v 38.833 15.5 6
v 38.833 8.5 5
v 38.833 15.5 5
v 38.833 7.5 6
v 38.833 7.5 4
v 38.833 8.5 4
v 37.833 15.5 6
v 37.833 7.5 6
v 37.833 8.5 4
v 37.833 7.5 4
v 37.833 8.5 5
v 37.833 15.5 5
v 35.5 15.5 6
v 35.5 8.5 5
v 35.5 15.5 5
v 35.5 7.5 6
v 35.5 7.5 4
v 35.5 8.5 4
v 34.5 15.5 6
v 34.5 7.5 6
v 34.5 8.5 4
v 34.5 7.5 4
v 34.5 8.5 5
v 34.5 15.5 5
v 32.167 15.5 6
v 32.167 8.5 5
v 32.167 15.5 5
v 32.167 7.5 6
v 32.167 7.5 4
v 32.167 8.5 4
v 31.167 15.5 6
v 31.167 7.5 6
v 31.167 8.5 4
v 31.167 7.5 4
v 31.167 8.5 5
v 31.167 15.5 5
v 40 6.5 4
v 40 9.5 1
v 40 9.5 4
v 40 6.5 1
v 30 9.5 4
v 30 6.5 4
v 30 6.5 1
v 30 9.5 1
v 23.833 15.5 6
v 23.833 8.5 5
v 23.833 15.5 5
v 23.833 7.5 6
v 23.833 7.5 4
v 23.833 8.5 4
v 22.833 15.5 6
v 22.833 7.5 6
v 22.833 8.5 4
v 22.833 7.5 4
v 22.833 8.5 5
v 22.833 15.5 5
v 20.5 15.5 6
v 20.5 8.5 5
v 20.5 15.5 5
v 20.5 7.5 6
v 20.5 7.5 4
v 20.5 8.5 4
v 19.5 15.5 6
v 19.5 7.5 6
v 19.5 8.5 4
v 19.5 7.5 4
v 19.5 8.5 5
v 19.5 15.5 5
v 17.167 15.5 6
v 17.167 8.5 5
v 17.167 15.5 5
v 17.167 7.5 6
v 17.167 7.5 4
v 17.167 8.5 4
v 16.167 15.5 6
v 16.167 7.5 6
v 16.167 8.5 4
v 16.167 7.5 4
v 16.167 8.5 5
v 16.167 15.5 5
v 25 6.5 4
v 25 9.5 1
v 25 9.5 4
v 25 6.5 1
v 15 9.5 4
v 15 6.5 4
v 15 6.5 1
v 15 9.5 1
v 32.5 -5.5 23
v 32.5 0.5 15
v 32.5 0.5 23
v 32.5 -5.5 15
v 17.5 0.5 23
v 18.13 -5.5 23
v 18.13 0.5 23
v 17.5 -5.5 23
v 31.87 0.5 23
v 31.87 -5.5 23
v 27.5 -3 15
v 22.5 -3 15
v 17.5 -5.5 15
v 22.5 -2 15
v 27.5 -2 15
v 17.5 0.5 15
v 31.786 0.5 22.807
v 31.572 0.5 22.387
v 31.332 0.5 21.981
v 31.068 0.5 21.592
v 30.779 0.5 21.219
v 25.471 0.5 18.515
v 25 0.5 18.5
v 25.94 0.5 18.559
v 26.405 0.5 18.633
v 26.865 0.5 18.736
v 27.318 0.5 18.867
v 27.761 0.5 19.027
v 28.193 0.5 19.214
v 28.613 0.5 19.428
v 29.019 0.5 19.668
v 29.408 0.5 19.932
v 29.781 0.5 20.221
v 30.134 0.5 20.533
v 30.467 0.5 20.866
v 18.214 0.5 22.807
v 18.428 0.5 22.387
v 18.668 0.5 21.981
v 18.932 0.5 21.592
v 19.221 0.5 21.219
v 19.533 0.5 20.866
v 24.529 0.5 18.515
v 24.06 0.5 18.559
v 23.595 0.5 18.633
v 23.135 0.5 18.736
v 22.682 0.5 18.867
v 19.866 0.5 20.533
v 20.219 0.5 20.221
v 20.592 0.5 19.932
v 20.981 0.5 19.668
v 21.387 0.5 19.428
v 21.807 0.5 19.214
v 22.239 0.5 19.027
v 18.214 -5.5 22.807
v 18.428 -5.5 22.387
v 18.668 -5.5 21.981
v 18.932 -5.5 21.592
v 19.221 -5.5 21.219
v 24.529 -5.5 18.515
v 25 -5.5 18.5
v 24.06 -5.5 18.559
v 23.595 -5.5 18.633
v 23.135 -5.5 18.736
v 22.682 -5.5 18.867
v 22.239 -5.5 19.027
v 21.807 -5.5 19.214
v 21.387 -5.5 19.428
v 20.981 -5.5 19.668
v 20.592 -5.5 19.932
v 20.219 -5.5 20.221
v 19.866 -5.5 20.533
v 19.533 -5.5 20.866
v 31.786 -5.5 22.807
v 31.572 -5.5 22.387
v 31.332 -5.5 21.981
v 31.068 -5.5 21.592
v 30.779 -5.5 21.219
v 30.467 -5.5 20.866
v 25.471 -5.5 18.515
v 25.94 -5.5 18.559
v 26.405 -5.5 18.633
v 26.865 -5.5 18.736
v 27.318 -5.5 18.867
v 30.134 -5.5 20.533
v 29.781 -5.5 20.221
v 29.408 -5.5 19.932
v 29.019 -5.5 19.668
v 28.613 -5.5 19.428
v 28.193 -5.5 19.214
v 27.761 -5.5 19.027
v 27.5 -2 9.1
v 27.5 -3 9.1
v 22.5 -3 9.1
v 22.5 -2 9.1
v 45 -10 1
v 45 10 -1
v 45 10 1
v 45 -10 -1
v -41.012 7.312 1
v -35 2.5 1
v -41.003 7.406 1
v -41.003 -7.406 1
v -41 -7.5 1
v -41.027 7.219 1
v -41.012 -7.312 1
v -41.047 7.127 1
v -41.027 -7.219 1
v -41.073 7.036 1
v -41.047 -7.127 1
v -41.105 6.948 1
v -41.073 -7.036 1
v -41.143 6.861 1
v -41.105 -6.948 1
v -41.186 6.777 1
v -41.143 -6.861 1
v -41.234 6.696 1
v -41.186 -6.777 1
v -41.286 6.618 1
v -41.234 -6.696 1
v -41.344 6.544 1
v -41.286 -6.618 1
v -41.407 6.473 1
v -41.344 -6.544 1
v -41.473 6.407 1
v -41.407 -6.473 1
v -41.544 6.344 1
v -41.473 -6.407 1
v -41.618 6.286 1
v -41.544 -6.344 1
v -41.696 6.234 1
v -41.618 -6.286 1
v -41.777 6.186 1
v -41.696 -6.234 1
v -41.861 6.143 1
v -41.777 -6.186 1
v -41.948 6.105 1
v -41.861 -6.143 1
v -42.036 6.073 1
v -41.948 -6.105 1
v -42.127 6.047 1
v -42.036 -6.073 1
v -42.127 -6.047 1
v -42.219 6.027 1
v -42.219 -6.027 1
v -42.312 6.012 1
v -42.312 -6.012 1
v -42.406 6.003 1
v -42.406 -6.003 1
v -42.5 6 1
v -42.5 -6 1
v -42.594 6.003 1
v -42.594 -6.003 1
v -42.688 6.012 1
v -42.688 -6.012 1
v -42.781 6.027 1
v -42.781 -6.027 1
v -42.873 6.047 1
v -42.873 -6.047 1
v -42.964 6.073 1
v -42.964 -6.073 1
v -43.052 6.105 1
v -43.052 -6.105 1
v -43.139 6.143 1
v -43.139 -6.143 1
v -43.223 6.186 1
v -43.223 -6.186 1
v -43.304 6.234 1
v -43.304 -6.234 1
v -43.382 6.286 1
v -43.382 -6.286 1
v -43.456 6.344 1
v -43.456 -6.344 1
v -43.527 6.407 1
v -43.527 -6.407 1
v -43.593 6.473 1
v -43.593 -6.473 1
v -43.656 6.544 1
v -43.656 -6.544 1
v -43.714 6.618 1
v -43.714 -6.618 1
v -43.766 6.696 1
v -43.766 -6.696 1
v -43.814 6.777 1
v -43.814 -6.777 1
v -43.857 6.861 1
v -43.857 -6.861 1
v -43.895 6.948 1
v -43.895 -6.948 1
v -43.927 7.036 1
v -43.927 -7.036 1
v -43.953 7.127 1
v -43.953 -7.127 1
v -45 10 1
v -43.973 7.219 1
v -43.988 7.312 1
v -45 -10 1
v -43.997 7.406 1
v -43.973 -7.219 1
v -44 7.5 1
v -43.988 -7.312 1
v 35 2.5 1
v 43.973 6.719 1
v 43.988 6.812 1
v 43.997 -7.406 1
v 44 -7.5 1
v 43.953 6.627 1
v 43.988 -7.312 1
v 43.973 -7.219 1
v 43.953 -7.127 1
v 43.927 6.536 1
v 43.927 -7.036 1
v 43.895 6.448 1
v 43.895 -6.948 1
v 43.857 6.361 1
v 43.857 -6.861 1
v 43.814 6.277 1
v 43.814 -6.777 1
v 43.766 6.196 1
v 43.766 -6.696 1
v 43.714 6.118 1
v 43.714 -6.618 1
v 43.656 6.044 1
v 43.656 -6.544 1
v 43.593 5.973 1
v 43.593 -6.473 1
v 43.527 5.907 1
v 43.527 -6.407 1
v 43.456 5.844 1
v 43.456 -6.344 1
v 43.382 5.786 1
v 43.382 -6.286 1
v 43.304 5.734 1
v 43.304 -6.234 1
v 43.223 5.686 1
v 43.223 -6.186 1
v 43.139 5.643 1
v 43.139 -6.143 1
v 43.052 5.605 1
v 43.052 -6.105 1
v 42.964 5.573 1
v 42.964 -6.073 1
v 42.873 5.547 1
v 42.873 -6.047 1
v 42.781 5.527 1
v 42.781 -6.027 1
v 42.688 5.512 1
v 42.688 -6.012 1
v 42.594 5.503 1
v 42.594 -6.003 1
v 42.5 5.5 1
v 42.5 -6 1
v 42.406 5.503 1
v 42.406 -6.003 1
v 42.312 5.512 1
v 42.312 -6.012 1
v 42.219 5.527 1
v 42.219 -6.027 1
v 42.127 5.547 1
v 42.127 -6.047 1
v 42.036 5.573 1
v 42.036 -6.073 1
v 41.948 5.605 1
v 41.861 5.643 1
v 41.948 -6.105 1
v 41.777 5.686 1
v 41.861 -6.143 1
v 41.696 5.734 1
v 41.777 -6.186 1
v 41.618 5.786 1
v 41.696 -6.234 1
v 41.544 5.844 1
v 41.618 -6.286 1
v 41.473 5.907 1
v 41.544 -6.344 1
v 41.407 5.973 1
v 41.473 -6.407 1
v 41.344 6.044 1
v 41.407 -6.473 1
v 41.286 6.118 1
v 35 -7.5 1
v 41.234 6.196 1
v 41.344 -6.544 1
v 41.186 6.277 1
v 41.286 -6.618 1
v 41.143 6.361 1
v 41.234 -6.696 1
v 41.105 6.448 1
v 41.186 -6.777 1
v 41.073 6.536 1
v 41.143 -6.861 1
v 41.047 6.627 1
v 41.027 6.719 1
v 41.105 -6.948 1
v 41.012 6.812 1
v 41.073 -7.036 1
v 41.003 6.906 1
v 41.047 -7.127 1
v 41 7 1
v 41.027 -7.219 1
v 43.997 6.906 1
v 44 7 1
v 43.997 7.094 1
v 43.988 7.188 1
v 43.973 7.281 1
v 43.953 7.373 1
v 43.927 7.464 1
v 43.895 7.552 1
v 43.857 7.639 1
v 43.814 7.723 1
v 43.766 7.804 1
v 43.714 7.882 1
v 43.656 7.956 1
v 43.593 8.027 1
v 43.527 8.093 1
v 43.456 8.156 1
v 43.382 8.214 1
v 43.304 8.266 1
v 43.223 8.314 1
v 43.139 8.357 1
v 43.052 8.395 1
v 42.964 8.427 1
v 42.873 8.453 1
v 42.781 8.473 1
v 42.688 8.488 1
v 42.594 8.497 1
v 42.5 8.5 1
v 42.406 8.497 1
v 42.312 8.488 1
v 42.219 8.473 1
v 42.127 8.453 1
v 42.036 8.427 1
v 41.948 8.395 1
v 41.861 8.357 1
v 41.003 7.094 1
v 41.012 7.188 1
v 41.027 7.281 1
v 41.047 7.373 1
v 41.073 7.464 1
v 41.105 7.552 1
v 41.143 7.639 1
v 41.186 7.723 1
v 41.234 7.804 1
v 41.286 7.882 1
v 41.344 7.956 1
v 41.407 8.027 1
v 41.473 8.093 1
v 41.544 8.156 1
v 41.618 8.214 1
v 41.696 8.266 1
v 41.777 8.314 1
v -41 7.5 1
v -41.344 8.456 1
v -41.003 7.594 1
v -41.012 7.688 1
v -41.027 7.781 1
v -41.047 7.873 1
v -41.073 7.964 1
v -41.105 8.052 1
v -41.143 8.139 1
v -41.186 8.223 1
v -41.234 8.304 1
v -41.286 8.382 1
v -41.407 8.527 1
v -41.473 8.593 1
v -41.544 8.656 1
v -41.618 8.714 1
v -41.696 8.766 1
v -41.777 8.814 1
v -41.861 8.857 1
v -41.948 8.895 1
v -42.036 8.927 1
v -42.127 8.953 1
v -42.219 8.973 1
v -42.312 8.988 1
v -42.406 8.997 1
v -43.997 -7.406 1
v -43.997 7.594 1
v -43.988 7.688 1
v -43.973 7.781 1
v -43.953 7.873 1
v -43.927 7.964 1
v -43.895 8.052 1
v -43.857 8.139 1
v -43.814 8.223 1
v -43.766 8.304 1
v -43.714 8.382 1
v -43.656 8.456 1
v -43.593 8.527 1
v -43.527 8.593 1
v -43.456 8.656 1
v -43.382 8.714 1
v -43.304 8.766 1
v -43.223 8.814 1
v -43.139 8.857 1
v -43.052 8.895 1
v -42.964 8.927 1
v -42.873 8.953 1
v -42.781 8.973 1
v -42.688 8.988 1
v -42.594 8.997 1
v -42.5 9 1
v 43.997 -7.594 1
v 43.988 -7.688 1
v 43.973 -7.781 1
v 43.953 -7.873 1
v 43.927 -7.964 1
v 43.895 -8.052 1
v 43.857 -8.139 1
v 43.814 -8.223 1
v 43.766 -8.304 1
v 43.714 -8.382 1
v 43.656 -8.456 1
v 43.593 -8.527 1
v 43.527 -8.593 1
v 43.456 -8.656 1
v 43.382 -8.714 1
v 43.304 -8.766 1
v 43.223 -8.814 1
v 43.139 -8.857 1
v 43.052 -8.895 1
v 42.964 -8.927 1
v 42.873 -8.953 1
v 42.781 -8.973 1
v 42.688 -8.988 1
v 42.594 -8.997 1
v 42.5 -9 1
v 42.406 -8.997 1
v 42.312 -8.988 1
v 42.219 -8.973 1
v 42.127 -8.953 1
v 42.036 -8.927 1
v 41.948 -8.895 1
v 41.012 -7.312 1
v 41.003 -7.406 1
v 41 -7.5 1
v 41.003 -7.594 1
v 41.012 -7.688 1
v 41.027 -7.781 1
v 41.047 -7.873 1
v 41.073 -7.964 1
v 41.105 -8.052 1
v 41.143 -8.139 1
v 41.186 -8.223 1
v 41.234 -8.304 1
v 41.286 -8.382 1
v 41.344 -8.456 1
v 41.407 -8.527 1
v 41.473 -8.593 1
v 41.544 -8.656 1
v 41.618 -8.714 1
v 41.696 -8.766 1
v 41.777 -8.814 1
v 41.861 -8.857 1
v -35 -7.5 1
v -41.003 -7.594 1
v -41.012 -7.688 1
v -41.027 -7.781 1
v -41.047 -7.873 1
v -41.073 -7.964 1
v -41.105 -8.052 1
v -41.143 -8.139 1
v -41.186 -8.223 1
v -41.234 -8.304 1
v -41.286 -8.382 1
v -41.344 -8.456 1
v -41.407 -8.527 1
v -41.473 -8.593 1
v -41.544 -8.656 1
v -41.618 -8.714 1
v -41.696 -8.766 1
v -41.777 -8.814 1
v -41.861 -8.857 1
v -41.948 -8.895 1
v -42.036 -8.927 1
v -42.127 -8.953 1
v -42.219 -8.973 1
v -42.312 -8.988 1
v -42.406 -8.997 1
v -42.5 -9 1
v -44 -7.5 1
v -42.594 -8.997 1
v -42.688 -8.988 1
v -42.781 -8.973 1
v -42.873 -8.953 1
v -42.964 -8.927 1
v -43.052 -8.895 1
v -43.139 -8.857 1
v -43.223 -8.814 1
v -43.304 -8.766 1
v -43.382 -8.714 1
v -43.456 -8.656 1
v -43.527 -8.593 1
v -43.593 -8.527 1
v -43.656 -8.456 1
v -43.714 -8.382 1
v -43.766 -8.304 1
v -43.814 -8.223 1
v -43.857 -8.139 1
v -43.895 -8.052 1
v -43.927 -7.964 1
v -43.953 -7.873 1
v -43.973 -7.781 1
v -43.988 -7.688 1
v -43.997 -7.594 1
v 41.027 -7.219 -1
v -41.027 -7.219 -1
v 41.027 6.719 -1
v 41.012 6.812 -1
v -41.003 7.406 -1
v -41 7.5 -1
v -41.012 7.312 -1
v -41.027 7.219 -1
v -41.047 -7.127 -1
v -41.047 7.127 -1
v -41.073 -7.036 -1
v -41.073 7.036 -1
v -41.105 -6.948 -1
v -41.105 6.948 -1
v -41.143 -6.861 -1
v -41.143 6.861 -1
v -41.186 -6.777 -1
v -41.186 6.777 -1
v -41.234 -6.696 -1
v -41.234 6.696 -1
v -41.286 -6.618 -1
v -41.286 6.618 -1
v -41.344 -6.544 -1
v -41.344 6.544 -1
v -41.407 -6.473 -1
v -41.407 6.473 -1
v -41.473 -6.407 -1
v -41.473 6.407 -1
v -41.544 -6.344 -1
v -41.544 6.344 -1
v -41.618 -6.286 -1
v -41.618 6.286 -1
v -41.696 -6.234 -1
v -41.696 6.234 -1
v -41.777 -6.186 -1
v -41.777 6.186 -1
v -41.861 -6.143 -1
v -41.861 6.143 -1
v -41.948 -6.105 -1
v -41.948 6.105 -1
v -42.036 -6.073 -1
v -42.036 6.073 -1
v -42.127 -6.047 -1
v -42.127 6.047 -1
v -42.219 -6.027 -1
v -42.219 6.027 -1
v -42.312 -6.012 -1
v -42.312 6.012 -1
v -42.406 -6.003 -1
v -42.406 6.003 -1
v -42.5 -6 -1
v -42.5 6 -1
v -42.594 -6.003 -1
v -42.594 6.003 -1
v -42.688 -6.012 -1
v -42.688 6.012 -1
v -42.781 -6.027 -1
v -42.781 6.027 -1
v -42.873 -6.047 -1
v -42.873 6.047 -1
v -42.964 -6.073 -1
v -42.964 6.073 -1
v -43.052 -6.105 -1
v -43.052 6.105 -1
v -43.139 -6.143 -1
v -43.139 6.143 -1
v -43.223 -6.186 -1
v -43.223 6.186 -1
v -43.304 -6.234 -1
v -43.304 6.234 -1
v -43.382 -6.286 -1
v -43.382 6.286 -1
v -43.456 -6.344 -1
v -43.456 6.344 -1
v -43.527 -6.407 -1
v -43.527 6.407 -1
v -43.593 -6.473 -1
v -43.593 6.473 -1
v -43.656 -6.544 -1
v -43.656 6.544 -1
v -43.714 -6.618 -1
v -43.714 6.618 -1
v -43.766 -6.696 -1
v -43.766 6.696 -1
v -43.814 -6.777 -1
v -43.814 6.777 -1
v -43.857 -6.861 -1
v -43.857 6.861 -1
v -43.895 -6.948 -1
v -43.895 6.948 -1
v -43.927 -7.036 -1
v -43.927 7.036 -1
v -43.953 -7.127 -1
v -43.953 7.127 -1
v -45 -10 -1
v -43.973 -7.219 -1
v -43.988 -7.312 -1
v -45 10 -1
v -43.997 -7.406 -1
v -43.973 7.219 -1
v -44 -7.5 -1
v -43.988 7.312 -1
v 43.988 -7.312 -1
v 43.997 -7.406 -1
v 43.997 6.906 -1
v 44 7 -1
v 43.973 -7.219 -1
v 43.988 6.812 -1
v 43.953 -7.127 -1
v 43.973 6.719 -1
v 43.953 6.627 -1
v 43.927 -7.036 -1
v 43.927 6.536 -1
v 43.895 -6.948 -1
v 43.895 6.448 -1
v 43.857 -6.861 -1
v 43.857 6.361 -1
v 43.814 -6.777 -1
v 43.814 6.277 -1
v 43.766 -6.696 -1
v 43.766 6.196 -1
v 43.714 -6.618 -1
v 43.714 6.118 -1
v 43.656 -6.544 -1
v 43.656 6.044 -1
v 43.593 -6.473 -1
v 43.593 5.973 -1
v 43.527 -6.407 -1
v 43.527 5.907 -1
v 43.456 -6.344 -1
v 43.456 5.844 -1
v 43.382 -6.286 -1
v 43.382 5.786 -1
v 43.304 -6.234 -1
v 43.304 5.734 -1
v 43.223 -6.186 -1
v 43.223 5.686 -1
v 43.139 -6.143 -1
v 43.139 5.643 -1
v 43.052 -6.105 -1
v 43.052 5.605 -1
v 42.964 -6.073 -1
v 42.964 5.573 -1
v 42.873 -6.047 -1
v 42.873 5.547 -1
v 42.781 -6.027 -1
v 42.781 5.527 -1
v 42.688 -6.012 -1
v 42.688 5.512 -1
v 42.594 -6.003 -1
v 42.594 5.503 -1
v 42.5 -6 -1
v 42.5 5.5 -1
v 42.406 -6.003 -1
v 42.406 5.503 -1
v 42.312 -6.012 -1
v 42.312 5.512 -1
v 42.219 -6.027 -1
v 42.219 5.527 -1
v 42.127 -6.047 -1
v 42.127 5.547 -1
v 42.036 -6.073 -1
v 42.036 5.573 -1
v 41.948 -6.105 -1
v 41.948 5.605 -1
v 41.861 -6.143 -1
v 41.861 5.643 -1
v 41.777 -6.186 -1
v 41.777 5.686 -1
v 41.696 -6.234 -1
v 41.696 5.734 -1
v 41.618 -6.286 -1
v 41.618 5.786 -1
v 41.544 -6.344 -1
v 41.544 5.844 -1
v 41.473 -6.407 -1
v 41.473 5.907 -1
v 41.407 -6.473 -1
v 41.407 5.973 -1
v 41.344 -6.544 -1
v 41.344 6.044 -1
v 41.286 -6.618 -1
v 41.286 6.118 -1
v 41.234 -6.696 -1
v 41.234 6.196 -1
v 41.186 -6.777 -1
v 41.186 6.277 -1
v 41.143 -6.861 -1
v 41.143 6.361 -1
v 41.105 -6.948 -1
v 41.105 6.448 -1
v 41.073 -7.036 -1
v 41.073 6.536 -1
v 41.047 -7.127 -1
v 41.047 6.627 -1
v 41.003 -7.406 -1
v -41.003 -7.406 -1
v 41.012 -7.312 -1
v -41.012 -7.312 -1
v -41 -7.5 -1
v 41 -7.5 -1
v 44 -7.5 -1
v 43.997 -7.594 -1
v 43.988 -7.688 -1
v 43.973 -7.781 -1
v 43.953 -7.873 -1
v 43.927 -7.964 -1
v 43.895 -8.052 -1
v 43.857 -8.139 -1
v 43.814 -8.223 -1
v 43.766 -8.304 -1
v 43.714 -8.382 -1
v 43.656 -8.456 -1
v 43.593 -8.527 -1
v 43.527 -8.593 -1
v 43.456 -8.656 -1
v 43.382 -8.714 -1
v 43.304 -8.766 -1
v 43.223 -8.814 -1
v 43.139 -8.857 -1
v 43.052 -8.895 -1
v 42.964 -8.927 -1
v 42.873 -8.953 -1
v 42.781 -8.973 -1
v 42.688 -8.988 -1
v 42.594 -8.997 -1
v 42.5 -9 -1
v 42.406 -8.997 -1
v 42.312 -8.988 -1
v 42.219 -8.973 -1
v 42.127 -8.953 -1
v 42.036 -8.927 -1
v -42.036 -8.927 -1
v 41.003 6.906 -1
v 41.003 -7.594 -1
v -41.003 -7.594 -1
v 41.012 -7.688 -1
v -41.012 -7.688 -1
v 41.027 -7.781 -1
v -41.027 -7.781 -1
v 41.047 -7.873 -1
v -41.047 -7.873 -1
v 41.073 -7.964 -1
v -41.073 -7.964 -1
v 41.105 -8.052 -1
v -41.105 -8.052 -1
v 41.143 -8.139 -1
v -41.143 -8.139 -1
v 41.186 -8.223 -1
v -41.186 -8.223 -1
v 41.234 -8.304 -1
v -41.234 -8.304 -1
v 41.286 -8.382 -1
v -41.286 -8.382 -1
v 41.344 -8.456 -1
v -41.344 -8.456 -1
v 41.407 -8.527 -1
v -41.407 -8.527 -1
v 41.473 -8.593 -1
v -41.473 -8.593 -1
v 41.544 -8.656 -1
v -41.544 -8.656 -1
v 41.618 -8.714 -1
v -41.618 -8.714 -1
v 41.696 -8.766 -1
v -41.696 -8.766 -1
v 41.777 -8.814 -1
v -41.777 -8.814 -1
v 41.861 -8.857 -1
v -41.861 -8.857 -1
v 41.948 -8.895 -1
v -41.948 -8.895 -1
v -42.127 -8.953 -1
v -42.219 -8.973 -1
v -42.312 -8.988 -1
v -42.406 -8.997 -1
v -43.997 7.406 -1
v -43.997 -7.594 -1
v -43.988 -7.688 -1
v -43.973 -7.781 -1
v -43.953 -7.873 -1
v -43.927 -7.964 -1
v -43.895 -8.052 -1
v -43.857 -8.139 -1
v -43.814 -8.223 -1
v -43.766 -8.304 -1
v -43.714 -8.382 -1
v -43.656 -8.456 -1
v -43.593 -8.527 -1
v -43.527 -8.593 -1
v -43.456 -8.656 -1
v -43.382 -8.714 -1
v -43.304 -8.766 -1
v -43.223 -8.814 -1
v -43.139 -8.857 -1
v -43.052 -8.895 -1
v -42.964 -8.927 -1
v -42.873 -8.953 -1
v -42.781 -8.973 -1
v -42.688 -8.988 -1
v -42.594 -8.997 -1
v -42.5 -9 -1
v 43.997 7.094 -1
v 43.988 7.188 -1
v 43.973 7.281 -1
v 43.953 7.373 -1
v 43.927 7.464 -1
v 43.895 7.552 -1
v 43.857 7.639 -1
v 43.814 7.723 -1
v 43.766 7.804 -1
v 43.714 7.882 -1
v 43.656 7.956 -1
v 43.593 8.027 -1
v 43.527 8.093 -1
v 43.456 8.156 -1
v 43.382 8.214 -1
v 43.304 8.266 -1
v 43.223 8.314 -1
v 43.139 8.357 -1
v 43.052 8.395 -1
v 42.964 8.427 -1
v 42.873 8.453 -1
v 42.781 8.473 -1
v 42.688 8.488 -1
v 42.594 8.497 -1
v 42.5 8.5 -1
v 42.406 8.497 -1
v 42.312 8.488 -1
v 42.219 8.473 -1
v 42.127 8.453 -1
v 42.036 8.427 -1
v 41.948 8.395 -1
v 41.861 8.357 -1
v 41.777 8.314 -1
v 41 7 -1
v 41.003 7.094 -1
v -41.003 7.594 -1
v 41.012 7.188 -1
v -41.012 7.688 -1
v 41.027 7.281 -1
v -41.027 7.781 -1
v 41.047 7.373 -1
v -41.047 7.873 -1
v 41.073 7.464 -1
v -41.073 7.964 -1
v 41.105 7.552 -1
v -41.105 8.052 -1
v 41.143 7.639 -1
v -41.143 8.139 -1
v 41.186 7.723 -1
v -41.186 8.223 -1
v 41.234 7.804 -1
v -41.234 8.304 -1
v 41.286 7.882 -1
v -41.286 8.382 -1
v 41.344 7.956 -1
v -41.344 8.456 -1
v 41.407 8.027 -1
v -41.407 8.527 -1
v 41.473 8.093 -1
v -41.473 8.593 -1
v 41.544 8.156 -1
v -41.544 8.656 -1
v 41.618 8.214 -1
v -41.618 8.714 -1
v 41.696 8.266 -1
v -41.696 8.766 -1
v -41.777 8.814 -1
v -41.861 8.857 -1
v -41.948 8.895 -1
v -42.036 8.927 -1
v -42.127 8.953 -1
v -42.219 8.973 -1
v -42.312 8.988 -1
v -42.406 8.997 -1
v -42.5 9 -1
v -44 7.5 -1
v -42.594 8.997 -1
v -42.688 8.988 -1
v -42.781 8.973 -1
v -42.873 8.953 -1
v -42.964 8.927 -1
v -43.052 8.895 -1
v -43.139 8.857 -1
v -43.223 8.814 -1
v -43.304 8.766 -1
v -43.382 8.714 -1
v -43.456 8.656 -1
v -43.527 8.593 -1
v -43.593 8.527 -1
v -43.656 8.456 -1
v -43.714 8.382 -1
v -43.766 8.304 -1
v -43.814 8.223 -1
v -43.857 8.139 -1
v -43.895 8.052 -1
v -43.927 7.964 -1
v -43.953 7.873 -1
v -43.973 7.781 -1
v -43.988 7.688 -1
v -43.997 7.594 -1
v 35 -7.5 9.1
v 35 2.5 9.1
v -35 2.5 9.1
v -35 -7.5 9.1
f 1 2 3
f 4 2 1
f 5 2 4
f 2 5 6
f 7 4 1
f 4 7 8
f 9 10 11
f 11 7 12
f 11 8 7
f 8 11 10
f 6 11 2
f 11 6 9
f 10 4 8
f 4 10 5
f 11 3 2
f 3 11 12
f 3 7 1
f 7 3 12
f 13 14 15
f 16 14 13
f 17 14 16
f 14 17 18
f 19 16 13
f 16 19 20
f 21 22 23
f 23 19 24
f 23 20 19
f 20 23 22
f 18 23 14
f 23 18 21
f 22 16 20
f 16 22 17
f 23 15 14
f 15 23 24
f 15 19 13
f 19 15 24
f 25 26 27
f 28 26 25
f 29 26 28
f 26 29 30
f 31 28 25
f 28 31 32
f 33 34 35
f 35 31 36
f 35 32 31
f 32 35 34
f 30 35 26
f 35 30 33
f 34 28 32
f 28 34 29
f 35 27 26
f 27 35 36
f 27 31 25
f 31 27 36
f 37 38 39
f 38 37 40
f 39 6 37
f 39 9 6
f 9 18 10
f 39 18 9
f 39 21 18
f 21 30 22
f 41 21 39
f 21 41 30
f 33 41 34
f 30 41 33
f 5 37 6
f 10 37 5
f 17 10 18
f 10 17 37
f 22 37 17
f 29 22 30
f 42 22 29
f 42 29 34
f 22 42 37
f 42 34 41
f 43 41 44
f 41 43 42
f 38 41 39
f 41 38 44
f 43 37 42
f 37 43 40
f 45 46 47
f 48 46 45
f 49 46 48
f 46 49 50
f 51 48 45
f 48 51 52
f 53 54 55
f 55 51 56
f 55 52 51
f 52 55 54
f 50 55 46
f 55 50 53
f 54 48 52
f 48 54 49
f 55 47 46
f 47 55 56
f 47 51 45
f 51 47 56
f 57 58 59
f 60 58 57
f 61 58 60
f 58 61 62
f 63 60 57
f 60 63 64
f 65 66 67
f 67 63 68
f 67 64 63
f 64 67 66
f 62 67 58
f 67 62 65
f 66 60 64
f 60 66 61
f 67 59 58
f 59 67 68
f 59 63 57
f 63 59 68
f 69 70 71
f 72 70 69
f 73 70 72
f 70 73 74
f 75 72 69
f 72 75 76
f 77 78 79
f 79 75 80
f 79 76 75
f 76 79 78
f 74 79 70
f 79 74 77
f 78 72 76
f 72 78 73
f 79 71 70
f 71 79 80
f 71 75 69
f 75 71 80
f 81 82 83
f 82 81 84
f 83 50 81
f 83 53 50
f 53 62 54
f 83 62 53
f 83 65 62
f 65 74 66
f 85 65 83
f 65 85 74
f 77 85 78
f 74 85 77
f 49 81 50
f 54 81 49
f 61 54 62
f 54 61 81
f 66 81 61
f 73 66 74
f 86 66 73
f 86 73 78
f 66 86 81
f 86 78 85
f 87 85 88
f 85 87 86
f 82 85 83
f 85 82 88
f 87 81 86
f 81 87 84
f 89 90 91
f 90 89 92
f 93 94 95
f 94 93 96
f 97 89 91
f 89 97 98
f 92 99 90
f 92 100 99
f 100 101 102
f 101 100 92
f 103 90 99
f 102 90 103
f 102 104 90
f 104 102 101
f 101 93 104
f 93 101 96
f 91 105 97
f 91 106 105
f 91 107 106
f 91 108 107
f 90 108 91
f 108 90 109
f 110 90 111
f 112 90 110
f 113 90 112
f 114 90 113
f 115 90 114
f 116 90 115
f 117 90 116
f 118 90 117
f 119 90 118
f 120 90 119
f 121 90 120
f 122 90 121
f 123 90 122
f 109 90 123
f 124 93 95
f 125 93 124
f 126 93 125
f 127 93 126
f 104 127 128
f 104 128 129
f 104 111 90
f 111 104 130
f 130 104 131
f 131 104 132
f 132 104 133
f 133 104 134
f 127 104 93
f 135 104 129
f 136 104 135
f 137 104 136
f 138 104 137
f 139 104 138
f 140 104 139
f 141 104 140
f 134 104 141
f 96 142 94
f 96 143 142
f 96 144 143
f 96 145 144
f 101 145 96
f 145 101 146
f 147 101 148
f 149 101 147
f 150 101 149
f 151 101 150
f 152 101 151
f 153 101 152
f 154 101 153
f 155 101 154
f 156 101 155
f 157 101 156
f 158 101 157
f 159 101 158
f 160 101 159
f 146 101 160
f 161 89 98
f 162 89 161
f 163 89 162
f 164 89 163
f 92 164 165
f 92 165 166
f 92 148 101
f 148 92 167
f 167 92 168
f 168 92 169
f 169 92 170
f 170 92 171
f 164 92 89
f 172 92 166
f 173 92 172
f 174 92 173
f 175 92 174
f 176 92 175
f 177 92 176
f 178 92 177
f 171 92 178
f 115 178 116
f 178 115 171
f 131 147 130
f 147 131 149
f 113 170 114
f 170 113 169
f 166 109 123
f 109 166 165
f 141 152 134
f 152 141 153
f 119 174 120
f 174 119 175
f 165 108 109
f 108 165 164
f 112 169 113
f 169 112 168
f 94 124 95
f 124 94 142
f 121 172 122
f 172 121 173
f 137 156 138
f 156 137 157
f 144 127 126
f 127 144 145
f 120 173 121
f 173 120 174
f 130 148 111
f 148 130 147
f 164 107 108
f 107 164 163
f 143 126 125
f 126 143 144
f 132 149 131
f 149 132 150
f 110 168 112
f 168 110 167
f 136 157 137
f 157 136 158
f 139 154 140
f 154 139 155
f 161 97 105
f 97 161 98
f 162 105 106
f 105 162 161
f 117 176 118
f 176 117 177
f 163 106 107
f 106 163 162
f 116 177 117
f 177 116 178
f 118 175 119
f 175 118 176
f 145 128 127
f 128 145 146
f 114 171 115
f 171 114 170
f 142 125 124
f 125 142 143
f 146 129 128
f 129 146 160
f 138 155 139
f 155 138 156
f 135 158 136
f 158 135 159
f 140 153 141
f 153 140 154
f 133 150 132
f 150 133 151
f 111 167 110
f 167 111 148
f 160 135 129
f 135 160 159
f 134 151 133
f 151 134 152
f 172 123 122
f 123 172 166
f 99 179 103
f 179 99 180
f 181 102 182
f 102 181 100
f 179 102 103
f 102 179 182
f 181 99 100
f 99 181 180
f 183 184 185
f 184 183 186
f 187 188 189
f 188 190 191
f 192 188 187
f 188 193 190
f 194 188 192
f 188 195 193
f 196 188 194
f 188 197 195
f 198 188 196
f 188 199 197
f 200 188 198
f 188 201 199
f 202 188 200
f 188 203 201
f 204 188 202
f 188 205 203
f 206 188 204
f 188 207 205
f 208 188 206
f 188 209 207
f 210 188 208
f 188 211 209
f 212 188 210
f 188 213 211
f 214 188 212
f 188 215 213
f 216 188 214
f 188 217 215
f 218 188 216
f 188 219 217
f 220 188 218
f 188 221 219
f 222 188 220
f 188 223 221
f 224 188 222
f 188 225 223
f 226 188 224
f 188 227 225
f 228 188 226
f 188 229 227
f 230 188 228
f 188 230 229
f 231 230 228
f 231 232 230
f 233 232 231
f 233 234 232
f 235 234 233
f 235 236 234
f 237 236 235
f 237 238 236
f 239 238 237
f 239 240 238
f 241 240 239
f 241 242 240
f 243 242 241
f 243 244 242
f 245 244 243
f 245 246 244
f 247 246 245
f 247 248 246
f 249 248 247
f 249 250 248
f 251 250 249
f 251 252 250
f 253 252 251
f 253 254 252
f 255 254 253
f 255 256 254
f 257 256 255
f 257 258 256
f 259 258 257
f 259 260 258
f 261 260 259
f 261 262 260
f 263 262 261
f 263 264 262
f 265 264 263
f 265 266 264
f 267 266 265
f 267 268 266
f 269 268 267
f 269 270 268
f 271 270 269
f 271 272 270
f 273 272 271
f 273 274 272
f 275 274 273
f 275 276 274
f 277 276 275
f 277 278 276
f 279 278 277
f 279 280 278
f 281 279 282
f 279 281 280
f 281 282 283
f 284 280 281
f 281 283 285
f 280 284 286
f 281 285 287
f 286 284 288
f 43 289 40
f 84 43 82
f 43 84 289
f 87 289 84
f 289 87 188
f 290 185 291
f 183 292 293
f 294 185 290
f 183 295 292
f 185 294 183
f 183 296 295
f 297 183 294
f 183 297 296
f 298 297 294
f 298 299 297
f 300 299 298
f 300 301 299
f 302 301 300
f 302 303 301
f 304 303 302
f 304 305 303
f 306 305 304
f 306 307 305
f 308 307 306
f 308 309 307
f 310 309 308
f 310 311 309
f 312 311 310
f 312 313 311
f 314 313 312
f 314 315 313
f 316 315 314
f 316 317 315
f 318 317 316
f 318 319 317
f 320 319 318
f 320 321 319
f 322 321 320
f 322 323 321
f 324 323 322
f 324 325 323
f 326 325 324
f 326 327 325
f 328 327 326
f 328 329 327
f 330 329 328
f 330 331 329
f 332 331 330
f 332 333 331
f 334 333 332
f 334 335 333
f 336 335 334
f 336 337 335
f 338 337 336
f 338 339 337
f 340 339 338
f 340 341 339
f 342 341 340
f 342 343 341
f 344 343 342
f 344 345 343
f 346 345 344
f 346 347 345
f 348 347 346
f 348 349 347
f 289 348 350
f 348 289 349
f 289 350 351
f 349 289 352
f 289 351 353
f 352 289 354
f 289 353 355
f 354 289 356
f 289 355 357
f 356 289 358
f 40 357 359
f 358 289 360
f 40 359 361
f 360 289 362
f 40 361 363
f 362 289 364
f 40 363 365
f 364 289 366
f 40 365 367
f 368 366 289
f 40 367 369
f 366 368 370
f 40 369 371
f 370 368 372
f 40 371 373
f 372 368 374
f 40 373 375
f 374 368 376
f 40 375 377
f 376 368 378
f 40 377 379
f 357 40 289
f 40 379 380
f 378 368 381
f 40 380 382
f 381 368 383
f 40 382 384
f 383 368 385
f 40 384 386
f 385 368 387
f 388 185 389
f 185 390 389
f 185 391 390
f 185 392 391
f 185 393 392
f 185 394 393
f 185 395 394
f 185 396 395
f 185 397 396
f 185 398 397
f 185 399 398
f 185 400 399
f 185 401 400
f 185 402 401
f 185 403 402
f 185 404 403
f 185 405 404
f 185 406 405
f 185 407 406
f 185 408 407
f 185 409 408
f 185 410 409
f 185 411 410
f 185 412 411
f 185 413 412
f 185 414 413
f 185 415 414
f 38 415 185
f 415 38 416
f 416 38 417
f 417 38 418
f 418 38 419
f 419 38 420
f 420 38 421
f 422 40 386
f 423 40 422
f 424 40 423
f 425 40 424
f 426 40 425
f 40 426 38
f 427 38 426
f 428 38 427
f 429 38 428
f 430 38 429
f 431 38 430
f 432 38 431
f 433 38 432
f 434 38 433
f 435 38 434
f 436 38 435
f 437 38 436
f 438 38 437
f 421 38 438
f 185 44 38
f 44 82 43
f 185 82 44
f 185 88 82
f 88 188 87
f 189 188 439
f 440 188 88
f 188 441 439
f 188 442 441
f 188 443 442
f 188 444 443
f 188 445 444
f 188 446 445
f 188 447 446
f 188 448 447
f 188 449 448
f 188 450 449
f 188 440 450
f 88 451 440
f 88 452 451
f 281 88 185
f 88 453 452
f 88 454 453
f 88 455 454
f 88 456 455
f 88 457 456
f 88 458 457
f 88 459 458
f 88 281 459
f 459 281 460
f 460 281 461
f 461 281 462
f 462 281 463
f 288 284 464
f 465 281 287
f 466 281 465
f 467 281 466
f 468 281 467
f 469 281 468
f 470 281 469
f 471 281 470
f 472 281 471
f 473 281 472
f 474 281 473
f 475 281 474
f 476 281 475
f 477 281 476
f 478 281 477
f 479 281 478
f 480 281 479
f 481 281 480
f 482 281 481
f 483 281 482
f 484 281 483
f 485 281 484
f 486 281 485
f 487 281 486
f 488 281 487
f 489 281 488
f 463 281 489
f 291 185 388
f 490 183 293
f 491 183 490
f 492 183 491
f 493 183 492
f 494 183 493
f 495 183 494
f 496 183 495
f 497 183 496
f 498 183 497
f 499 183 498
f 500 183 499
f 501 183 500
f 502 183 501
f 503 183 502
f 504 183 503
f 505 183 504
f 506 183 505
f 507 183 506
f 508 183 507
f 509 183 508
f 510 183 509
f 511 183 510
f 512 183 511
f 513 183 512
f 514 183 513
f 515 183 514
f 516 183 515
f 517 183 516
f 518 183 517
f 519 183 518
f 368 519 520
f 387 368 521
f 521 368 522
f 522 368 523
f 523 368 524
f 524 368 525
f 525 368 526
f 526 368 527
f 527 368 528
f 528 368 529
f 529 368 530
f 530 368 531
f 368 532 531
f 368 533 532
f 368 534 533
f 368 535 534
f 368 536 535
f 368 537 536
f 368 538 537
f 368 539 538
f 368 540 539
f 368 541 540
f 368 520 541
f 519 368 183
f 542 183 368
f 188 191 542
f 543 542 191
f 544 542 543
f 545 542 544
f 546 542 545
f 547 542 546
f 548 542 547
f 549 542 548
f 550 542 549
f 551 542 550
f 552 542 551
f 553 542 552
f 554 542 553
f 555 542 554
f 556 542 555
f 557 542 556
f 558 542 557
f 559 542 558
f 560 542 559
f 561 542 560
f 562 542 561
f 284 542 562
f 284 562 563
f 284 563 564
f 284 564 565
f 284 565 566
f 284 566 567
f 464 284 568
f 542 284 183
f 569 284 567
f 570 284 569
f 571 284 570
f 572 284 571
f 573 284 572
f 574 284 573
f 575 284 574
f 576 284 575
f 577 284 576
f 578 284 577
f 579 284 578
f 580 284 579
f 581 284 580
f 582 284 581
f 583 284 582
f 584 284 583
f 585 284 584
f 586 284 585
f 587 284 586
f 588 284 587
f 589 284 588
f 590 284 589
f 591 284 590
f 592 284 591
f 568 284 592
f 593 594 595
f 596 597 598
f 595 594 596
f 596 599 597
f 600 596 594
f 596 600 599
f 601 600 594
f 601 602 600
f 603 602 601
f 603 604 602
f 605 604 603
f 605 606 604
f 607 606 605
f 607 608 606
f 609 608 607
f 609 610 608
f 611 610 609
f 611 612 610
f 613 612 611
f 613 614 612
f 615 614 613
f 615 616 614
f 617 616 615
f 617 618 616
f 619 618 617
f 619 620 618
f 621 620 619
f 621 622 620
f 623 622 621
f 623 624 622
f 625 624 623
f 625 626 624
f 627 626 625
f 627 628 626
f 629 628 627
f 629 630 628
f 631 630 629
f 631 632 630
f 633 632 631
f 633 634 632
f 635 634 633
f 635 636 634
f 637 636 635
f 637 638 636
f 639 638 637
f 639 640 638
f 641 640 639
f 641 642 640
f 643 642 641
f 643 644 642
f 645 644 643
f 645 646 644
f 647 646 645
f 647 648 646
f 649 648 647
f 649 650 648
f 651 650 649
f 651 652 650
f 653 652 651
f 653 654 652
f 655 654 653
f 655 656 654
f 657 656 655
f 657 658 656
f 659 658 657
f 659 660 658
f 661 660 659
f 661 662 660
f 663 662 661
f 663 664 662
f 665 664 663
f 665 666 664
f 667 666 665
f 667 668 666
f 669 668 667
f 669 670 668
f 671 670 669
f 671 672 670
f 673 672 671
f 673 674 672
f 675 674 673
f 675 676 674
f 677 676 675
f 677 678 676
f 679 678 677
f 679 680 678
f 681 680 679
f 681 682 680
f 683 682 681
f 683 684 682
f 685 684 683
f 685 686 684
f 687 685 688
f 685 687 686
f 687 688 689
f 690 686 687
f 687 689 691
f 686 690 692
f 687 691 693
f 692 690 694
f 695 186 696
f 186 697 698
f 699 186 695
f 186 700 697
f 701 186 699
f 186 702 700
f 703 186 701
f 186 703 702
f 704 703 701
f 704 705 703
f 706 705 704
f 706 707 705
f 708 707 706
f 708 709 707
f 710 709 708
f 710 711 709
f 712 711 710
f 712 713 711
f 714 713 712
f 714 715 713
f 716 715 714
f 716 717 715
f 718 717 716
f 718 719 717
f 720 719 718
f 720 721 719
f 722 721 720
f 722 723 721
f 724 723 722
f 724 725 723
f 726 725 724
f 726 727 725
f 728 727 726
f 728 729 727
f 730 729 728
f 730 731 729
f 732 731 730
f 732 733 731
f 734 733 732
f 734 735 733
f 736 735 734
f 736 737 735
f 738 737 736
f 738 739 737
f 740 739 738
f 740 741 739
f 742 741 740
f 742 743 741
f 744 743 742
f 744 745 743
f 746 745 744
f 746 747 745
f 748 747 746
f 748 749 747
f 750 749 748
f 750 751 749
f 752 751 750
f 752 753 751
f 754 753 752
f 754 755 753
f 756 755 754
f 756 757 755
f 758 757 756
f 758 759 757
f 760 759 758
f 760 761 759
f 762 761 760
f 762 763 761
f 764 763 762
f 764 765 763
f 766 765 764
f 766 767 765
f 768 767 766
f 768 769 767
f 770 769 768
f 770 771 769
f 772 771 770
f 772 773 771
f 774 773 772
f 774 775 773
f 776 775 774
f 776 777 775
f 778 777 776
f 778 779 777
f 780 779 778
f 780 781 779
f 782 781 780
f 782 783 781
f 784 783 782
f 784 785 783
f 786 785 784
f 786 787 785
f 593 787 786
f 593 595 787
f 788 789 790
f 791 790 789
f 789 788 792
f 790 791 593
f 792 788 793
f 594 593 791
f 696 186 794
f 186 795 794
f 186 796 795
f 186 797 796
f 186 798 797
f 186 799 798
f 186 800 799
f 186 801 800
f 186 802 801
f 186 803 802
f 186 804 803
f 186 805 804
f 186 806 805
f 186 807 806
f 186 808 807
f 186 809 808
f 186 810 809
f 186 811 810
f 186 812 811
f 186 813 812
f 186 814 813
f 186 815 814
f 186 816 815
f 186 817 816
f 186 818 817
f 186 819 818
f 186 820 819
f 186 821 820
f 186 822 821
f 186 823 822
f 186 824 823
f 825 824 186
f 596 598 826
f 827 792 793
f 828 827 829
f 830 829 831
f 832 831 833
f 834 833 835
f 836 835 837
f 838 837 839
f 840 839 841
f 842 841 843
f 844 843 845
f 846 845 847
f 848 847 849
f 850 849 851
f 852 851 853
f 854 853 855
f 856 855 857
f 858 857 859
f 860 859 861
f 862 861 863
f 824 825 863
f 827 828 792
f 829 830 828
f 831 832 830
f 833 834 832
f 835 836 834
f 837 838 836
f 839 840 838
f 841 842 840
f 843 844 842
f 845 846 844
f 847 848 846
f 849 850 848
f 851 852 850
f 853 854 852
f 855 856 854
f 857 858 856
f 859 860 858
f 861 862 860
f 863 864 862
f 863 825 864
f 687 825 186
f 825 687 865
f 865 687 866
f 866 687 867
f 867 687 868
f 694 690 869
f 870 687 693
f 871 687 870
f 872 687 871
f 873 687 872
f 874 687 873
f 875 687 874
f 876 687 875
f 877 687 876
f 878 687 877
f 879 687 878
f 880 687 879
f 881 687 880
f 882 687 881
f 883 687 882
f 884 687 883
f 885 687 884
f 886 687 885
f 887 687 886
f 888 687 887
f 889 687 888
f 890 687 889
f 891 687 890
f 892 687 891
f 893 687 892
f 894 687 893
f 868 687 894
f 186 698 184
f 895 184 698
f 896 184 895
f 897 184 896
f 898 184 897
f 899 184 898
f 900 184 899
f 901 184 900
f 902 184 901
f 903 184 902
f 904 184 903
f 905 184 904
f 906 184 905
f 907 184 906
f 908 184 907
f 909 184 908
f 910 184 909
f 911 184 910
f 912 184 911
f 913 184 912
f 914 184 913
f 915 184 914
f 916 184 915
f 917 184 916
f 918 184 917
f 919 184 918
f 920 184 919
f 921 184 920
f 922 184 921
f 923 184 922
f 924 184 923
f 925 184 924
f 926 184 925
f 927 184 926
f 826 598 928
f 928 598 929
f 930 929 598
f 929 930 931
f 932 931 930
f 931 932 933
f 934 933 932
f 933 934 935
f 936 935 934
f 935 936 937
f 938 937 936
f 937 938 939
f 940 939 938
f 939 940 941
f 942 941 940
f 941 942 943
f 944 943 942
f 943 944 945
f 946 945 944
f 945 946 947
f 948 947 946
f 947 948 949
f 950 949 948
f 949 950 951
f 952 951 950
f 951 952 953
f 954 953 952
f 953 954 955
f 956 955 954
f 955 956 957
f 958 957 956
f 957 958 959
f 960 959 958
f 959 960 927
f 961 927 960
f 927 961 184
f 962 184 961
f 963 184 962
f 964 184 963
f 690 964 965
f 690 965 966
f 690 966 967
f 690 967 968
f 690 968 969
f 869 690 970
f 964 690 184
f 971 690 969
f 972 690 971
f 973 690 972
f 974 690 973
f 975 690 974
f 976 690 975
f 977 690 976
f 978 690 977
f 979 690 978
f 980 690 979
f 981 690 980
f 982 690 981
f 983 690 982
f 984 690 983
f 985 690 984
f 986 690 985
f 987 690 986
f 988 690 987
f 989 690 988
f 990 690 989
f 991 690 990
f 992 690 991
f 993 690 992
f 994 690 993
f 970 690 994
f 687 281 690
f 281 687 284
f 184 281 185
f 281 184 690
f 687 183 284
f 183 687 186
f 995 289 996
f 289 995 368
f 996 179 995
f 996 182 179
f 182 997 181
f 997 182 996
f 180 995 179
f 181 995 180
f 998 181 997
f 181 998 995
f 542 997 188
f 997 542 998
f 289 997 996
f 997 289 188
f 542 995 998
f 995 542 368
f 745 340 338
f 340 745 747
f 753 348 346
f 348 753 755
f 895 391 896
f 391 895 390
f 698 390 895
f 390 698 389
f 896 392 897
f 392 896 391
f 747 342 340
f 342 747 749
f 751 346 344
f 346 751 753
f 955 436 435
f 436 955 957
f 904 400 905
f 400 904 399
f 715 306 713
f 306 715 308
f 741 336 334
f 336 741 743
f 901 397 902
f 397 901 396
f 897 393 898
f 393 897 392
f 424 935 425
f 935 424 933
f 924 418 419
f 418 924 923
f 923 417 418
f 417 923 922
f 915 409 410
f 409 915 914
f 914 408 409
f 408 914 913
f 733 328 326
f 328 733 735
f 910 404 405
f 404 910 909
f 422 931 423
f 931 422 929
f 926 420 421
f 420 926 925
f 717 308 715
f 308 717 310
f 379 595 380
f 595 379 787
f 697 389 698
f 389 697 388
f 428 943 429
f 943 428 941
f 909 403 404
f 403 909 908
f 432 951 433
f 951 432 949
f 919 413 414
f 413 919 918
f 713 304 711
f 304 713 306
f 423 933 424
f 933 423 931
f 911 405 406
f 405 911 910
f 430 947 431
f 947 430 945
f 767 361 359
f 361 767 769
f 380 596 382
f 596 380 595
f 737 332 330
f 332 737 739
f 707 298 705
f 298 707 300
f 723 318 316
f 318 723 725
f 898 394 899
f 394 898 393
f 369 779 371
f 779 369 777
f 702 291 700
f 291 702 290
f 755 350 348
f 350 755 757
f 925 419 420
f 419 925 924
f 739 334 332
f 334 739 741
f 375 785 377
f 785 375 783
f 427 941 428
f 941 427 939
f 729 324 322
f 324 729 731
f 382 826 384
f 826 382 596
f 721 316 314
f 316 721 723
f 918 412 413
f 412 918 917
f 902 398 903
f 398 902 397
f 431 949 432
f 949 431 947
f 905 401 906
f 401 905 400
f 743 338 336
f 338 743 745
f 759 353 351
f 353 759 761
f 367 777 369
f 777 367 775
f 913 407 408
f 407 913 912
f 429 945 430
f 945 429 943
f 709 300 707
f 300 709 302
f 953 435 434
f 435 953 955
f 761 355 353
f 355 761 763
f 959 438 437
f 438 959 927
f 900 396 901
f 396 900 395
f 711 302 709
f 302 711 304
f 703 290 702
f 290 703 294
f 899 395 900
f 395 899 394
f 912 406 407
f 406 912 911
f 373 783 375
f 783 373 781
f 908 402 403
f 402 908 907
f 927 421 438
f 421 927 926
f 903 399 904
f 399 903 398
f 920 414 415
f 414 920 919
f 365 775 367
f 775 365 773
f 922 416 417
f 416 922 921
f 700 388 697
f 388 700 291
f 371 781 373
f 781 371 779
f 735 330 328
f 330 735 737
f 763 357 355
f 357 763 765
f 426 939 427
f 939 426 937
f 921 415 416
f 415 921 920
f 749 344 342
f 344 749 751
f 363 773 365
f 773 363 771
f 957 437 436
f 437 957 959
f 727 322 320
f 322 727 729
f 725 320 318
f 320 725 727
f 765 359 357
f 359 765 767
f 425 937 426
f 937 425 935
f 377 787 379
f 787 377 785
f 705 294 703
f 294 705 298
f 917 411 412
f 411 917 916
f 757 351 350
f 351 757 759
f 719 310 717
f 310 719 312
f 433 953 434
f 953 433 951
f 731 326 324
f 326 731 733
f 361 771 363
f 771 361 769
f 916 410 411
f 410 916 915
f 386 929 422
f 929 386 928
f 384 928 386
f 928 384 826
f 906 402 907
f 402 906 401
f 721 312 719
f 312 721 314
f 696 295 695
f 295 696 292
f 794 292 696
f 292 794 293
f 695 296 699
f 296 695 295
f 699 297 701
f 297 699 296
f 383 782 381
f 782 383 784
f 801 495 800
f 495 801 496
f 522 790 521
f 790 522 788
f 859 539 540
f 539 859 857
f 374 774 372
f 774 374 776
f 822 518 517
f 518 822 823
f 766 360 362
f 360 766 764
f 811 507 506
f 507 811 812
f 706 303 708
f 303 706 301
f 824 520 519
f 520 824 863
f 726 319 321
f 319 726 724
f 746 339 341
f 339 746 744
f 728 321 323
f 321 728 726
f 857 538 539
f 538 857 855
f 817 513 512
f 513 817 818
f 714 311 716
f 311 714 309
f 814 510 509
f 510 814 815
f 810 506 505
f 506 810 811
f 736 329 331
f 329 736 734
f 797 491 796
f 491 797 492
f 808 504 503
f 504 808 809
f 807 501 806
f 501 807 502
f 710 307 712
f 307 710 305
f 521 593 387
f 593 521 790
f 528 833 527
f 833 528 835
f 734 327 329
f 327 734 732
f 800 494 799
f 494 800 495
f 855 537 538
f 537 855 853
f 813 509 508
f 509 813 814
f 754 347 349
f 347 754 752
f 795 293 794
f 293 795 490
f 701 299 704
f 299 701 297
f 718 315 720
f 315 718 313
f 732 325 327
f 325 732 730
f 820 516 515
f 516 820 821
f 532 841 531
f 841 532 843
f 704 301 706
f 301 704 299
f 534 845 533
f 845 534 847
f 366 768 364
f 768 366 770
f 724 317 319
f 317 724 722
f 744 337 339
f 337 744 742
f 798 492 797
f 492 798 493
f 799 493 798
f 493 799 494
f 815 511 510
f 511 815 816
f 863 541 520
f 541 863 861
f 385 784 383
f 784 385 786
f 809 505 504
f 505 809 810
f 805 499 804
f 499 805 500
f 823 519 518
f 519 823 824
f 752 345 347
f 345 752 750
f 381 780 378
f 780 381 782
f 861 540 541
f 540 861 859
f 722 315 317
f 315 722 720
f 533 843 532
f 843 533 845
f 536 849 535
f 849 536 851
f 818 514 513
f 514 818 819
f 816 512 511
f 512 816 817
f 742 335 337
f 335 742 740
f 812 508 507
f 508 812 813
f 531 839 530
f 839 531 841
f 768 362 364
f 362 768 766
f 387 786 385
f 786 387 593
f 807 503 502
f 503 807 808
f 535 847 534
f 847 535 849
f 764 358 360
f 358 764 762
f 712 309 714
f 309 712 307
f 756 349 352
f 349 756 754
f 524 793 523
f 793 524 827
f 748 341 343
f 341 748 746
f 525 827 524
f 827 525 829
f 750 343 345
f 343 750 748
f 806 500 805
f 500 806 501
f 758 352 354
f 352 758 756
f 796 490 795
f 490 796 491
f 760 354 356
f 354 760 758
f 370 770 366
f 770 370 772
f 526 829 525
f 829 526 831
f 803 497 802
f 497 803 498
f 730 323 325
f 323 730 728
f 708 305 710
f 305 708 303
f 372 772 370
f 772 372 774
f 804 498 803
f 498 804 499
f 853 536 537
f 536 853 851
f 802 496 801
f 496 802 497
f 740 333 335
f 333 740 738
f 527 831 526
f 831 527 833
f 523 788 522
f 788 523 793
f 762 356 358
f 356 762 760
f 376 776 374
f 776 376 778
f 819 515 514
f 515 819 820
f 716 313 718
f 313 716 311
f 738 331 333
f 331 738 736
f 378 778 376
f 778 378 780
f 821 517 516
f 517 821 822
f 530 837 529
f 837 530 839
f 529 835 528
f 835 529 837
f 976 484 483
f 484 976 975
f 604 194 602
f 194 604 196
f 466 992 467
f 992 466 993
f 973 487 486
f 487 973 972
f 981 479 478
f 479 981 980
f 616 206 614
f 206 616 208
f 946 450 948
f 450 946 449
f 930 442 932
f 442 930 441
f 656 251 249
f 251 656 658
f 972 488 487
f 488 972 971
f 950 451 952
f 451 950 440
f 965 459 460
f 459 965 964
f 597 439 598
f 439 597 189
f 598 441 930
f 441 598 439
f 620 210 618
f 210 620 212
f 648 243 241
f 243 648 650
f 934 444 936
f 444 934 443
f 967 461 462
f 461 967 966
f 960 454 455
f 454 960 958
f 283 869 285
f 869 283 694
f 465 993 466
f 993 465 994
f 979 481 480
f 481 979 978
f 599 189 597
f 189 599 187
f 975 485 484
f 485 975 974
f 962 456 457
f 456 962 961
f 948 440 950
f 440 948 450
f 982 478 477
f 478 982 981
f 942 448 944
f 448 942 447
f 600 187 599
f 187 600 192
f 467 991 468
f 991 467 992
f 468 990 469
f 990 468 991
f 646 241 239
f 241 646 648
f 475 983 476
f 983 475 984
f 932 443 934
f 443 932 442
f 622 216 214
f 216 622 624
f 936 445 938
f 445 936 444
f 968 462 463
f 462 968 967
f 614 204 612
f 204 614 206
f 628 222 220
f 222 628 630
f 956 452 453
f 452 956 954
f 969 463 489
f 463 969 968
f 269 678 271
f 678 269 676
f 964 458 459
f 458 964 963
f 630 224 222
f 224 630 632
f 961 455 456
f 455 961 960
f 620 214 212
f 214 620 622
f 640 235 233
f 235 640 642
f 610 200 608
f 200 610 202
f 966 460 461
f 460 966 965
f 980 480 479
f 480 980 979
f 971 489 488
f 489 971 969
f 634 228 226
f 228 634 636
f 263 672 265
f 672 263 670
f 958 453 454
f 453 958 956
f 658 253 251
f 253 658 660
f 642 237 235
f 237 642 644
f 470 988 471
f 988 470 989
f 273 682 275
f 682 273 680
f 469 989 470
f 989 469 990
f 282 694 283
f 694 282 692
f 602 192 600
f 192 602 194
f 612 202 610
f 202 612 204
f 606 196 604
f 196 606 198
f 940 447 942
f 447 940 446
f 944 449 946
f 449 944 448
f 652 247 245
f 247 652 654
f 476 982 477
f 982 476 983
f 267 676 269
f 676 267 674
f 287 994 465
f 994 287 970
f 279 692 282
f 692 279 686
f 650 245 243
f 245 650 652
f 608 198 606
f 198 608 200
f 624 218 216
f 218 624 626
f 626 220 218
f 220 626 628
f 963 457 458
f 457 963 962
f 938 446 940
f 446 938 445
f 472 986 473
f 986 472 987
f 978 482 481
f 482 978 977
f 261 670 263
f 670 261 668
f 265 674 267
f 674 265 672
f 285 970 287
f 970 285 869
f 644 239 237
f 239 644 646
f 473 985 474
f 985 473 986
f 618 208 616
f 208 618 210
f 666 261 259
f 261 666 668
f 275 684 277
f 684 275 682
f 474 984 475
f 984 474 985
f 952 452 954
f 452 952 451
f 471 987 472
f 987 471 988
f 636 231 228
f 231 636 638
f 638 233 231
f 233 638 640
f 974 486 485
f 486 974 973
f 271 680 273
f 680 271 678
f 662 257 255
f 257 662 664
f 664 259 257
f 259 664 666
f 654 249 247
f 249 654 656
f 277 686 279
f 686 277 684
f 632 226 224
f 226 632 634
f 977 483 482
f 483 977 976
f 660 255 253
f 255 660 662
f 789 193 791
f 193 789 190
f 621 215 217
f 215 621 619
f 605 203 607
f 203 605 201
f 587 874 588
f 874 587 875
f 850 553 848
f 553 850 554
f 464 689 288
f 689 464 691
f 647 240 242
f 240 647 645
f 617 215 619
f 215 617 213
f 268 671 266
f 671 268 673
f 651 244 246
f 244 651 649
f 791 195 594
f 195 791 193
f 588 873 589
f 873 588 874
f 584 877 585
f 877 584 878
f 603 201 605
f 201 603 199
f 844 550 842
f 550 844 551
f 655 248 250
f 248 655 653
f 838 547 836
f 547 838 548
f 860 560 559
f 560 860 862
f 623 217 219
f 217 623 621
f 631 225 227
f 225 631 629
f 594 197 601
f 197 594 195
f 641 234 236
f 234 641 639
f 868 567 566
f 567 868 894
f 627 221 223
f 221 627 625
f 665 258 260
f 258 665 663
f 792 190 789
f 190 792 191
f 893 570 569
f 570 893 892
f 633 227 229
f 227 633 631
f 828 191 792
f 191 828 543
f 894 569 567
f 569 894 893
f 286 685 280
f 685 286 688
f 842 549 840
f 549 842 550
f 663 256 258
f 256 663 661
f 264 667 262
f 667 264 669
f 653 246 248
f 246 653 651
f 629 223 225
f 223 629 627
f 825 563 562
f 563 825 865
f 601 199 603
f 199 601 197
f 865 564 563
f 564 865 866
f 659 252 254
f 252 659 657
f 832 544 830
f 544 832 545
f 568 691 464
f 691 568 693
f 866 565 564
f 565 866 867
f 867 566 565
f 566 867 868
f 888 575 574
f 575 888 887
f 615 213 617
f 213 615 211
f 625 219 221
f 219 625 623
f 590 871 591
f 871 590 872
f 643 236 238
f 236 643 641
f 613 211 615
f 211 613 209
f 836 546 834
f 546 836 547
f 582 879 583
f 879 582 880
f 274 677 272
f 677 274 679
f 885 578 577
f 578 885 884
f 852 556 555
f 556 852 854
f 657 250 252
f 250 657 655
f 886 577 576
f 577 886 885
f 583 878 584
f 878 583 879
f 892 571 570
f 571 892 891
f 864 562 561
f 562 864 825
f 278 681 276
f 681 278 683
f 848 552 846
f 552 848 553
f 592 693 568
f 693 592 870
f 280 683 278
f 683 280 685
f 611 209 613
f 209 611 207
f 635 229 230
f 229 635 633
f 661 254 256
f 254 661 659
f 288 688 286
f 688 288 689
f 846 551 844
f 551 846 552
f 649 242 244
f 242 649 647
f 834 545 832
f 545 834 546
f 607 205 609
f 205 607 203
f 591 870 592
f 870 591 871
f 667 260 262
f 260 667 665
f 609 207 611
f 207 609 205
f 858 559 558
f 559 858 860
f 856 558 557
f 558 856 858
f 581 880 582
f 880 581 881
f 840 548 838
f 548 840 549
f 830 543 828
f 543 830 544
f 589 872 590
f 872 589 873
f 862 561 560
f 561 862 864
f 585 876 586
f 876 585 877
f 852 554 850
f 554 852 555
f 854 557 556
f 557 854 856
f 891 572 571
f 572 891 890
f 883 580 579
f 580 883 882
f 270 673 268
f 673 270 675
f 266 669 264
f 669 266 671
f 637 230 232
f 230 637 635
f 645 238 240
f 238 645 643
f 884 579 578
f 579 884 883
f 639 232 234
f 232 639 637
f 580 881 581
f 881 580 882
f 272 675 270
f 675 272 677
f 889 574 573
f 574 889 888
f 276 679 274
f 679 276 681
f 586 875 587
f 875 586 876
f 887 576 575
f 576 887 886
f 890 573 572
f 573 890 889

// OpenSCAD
spodok_dlzka = 90;
spodok_sirka = 20;
spodok_hrubka = 2;

piny_dlzka = 10;
piny_sirka = 3;
piny_hrubka = 4;

diera_d = 3 ; // d = diameter -> priemer

module diera()
{
    cylinder (h = 8, d = diera_d, center = true, $fn=100);
}
module spodok() 
{
    color( "red", 1.0 )
     cube([spodok_dlzka,spodok_sirka,spodok_hrubka], true);
}

module Lko()
{
   color( "silver", 1.0 )
    {
    translate([0,0,-3/2+1])
     cube([1,1,3], true);
    translate([-0.5,-0.5,0])
        cube([1,8,1], false);
    }
}

module buxa() //krabica na piny
{
    color( "black", 1.0 )
     cube([piny_dlzka,piny_sirka,piny_hrubka], true);
    
}

module piny()
{
    buxa();
    translate([piny_dlzka/3,0,piny_hrubka-1])
     Lko();
    translate([0,0,piny_hrubka-1])
     Lko();
    translate([-piny_dlzka/3,0,piny_hrubka-1])
     Lko();
}

module krabica() //sranda s posuvnou srandou
{
    color( "gray", 1.0 )
     cube([spodok_dlzka-20,spodok_sirka/2,      spodok_hrubka*5], true);
}

module cindzik() //to je ta sranda ktora sa posuva
{
    color( "silver", 1.0 )
    translate([0,0,10/2])
    cube([5,1,10], true);
    color( "yellow", 1.0 )
    difference()
    {
        translate([0,0,14])
        cube([15,6,8], true);
        translate([0,0,21])
            rotate ([90,0,0])
                cylinder (h = 10, r=7.5, center = true, $fn=100);
    }  
}

module diery()
{
    translate([spodok_dlzka/2 - 2.5,spodok_sirka/2 - 3,0])
     diera();
    
    translate([spodok_dlzka/2 - 2.5,-spodok_sirka/2 + 2.5,0])
     diera();
    
    translate([-spodok_dlzka/2 + 2.5,spodok_sirka/2 -2.5,0])
     diera();
    
    translate([-spodok_dlzka/2 + 2.5,-spodok_sirka/2 + 2.5,0])
     diera();
}
module celok()
{
   spodok();
   translate([spodok_dlzka/2 - piny_dlzka/2 - 5,spodok_sirka/2 - 2,piny_hrubka/2])
    piny(); 
    
   translate([spodok_dlzka/2 - piny_dlzka/2 - 5 - piny_dlzka*1.5,spodok_sirka/2 - 2,piny_hrubka/2])
    piny(); 
    
    translate([0,-2.5,spodok_hrubka*5/2 - 0.9])
    krabica();
    
    translate([spodok_dlzka/2 - 20,-2.5,spodok_hrubka*5/2])
    cindzik();
}


difference() 
{
celok();
diery();
}
